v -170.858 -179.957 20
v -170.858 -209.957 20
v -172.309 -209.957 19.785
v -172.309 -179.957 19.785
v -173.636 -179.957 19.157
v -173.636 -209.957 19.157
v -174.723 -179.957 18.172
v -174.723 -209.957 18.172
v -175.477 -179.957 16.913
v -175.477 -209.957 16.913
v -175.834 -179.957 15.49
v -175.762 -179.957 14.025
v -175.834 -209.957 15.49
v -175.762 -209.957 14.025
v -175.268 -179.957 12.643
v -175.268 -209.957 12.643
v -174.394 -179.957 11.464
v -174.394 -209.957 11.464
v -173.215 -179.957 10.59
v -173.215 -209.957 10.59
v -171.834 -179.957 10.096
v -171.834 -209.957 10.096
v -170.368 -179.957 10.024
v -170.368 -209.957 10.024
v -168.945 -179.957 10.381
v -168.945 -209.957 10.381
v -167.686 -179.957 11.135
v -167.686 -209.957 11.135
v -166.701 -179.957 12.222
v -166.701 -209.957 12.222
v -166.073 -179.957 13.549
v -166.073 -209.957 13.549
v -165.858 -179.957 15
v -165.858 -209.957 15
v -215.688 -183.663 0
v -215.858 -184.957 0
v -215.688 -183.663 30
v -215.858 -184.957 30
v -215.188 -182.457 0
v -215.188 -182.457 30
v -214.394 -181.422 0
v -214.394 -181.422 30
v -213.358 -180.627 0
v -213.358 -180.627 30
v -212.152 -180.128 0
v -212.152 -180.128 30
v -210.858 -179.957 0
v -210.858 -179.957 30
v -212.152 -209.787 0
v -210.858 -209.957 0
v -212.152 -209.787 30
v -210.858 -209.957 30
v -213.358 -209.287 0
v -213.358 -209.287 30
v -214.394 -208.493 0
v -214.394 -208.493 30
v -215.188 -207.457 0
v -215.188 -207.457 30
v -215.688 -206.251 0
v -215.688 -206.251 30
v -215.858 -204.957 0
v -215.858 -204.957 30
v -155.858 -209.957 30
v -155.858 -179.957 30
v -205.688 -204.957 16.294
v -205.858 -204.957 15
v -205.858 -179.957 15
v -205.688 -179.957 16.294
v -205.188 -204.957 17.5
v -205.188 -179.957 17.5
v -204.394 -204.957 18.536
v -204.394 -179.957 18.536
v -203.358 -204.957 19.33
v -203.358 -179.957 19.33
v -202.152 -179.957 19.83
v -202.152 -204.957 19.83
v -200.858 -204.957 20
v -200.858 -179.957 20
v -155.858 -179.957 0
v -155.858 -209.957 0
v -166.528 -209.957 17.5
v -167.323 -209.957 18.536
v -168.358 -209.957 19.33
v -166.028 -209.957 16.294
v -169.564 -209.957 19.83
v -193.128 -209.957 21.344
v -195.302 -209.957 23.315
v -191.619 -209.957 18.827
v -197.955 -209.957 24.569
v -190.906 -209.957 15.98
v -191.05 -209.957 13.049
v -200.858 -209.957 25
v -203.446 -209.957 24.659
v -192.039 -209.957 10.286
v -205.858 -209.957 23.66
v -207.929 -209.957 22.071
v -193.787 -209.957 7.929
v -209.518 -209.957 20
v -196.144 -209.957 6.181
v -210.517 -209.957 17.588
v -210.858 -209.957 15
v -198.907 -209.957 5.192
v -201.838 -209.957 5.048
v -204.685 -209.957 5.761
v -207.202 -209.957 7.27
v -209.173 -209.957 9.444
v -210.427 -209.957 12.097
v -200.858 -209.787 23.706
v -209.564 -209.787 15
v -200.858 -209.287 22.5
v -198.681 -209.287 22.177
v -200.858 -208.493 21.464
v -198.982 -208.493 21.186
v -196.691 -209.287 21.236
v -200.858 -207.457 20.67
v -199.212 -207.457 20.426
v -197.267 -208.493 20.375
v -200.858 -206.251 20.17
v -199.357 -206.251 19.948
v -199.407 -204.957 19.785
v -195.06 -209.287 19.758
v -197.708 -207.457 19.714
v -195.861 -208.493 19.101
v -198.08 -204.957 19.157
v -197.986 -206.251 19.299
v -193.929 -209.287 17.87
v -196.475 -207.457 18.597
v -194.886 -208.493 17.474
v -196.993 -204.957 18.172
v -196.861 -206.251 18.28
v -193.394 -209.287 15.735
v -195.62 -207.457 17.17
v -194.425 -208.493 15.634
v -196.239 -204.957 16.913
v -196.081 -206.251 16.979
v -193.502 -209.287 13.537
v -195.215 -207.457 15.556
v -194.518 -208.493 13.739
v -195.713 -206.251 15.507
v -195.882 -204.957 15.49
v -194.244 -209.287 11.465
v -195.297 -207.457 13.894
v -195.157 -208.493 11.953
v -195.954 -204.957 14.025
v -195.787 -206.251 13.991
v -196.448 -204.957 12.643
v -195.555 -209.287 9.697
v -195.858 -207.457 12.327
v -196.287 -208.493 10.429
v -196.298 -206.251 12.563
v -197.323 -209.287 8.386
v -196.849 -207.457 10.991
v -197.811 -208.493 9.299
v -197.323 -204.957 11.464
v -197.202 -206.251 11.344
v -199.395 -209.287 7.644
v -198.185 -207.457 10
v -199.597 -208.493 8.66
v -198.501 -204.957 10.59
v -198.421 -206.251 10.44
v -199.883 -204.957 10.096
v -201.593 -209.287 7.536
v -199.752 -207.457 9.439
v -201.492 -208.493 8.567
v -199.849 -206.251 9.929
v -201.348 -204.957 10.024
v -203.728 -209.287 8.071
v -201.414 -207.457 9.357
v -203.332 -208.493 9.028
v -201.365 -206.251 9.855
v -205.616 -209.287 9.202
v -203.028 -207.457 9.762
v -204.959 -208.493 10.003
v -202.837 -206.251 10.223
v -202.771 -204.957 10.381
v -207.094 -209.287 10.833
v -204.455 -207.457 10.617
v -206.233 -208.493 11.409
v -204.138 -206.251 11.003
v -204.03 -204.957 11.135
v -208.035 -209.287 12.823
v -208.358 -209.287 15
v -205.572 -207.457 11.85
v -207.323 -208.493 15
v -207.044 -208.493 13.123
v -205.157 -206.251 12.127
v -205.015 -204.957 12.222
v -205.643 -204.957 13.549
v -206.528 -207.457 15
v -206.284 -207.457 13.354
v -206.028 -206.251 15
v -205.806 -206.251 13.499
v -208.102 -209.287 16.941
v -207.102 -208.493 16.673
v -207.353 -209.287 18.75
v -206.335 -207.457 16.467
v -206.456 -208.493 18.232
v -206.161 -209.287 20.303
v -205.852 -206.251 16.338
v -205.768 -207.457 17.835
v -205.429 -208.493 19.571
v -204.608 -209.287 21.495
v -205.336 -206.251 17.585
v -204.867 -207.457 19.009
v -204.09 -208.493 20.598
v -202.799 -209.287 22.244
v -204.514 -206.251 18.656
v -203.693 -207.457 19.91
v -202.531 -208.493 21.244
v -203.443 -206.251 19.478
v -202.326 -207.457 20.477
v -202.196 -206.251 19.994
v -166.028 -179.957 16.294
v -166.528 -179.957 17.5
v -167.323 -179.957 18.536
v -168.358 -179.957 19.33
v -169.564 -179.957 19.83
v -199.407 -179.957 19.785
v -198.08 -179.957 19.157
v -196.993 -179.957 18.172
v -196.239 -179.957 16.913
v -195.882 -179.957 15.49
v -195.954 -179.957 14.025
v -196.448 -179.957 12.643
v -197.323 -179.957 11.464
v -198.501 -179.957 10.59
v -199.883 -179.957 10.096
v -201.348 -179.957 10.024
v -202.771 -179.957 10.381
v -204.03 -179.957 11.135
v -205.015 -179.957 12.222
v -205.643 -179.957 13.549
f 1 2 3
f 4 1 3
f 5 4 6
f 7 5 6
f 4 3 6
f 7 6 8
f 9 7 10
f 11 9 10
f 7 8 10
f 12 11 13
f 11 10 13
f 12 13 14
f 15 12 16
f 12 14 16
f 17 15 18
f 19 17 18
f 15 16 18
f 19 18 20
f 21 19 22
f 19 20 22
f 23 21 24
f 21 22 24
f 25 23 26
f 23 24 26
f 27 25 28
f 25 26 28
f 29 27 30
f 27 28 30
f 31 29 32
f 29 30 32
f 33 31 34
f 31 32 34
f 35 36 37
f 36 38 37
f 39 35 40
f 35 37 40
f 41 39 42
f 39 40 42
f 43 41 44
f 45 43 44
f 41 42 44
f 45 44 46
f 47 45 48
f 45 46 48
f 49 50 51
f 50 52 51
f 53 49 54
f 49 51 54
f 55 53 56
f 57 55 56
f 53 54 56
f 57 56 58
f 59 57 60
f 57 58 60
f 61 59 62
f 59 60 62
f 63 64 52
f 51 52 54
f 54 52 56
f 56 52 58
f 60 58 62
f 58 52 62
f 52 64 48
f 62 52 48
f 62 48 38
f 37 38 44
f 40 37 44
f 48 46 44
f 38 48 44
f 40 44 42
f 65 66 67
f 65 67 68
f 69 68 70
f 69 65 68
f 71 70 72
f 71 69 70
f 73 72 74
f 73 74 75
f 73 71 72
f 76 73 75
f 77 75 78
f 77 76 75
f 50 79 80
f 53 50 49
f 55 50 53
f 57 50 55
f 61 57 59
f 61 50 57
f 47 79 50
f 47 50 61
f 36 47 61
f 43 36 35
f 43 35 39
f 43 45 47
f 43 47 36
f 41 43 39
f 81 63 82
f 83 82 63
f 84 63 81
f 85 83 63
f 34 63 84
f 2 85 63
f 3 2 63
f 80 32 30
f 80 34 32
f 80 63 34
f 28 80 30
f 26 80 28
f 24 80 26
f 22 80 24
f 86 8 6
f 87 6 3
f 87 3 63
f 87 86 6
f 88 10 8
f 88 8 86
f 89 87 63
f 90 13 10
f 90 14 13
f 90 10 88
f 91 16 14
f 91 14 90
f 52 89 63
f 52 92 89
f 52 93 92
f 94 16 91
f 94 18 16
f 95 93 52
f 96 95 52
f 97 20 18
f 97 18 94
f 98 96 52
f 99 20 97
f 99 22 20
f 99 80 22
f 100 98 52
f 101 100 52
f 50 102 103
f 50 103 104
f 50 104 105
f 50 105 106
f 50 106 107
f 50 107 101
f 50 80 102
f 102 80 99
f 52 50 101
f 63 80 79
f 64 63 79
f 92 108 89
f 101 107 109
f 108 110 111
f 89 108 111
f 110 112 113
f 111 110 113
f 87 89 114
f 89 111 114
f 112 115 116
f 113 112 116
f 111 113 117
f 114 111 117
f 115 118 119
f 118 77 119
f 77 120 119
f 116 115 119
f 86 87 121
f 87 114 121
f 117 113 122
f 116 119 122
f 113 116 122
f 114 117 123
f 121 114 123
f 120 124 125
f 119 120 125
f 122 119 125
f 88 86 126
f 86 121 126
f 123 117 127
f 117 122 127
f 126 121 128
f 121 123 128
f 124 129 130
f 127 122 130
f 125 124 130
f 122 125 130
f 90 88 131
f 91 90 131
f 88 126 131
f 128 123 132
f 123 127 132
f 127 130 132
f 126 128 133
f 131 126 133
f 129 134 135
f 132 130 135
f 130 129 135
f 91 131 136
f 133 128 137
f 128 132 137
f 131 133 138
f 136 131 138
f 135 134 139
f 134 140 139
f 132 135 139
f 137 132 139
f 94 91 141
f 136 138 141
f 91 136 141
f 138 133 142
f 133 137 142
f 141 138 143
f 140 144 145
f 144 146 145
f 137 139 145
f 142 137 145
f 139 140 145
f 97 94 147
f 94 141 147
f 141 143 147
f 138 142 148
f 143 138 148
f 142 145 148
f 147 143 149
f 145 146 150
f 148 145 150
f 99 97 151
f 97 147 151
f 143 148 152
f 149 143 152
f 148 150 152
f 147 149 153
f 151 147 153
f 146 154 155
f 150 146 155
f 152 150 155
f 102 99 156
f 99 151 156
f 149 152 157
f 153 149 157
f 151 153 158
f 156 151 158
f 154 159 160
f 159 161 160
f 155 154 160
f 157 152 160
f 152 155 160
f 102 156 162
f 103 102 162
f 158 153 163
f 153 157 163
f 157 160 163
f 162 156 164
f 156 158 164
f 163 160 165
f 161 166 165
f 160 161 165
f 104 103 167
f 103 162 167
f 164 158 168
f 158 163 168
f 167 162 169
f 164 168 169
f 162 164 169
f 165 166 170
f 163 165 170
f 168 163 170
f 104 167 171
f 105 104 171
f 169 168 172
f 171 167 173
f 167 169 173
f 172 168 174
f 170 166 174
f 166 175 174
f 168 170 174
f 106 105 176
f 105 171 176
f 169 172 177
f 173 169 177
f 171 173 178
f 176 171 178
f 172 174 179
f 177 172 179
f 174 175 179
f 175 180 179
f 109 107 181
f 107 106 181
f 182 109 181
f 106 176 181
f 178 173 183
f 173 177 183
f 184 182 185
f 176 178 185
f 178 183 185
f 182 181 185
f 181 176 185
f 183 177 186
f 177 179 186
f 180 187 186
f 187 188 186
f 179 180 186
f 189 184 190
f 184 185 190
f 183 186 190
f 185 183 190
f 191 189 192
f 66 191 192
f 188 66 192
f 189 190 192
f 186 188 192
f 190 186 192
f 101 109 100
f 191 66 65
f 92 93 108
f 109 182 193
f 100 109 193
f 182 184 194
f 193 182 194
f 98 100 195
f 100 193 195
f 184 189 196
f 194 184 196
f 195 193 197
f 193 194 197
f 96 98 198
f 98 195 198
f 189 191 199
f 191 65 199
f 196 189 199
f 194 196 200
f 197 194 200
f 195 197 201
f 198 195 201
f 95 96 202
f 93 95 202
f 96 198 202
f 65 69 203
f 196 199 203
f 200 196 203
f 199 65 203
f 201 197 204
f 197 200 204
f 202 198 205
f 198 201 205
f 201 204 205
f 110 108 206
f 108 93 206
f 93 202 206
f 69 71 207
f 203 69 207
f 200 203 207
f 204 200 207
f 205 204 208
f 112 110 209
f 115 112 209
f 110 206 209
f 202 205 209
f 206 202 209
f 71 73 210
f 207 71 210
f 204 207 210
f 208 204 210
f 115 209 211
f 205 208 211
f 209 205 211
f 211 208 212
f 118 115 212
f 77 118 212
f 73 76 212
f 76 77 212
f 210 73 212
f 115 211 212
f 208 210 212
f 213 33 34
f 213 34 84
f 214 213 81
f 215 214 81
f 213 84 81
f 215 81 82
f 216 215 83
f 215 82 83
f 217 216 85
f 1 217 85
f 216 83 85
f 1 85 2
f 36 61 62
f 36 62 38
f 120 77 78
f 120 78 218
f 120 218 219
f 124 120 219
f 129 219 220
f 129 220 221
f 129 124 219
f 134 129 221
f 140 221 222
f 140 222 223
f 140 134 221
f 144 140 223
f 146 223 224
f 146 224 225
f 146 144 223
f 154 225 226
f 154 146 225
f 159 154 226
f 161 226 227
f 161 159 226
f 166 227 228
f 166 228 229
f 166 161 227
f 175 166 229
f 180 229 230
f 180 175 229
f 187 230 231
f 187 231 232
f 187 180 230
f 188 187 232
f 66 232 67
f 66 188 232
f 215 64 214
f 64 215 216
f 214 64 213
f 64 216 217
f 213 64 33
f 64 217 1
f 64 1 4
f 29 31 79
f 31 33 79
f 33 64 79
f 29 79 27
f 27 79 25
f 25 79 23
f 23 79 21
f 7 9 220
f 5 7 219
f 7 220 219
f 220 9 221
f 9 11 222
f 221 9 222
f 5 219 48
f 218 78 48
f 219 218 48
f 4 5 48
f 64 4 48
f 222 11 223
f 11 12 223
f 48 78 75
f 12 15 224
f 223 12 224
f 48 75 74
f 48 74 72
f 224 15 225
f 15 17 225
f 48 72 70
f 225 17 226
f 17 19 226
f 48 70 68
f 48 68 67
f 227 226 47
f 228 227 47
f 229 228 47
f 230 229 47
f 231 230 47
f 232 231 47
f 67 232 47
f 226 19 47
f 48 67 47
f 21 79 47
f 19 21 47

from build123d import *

# Parameters (mm, degrees)
F0_W     = 30
F0_H     = 30
F1_DEPTH = 30
F3_DEPTH = 30.001
F5_R     = 5
F6_R     = 4.99999


# Not quite as in the source:
# - a fillet or chamfer is up to 0.001 mm smaller than in the source, because OpenCascade refuses the exact size


with BuildPart() as f1:
    # F0 (on Top) → F1 (new body)
    with BuildSketch(Plane.XY):
        with Locations((-170.8580559492, -194.9572271109)):
            Rectangle(F0_W, F0_H)
    extrude(amount=F1_DEPTH)

    # F2 (on face) → F3 (cut, through all)
    with BuildSketch(Plane.XZ.offset(209.9572271109)):
        with BuildLine():
            ThreePointArc((-170.8580559492, 20), (-174.3935898551, 11.4644660941), (-165.8580559492, 15))
            ThreePointArc((-165.8580559492, 15), (-167.3225220433, 18.5355339059), (-170.8580559492, 20))
        make_face()
    extrude(amount=-F3_DEPTH, mode=Mode.SUBTRACT)

    # F4: F1 across face


with BuildPart() as f1_1:
    add(f1.part)
    add(f1.part.mirror(Plane(origin=(-185.8580559492, -194.9572271109, 15), x_dir=(0, -1, 0), z_dir=(-1, 0, 0))))

    # F5
    f5_edges = [f1_1.edges().sort_by_distance(p)[0] for p in [
        (-215.858056, -209.957227, 15),
    ]]
    fillet(f5_edges, radius=F5_R)

    # F6 (radius 5 in the source; OpenCascade refuses exactly that, so slightly less here)
    f6_edges = [f1_1.edges().sort_by_distance(p)[0] for p in [
        (-215.858056, -179.957227, 15),
        (-195.858056, -209.957227, 15),
    ]]
    fillet(f6_edges, radius=F6_R)


solid = f1_1.part
